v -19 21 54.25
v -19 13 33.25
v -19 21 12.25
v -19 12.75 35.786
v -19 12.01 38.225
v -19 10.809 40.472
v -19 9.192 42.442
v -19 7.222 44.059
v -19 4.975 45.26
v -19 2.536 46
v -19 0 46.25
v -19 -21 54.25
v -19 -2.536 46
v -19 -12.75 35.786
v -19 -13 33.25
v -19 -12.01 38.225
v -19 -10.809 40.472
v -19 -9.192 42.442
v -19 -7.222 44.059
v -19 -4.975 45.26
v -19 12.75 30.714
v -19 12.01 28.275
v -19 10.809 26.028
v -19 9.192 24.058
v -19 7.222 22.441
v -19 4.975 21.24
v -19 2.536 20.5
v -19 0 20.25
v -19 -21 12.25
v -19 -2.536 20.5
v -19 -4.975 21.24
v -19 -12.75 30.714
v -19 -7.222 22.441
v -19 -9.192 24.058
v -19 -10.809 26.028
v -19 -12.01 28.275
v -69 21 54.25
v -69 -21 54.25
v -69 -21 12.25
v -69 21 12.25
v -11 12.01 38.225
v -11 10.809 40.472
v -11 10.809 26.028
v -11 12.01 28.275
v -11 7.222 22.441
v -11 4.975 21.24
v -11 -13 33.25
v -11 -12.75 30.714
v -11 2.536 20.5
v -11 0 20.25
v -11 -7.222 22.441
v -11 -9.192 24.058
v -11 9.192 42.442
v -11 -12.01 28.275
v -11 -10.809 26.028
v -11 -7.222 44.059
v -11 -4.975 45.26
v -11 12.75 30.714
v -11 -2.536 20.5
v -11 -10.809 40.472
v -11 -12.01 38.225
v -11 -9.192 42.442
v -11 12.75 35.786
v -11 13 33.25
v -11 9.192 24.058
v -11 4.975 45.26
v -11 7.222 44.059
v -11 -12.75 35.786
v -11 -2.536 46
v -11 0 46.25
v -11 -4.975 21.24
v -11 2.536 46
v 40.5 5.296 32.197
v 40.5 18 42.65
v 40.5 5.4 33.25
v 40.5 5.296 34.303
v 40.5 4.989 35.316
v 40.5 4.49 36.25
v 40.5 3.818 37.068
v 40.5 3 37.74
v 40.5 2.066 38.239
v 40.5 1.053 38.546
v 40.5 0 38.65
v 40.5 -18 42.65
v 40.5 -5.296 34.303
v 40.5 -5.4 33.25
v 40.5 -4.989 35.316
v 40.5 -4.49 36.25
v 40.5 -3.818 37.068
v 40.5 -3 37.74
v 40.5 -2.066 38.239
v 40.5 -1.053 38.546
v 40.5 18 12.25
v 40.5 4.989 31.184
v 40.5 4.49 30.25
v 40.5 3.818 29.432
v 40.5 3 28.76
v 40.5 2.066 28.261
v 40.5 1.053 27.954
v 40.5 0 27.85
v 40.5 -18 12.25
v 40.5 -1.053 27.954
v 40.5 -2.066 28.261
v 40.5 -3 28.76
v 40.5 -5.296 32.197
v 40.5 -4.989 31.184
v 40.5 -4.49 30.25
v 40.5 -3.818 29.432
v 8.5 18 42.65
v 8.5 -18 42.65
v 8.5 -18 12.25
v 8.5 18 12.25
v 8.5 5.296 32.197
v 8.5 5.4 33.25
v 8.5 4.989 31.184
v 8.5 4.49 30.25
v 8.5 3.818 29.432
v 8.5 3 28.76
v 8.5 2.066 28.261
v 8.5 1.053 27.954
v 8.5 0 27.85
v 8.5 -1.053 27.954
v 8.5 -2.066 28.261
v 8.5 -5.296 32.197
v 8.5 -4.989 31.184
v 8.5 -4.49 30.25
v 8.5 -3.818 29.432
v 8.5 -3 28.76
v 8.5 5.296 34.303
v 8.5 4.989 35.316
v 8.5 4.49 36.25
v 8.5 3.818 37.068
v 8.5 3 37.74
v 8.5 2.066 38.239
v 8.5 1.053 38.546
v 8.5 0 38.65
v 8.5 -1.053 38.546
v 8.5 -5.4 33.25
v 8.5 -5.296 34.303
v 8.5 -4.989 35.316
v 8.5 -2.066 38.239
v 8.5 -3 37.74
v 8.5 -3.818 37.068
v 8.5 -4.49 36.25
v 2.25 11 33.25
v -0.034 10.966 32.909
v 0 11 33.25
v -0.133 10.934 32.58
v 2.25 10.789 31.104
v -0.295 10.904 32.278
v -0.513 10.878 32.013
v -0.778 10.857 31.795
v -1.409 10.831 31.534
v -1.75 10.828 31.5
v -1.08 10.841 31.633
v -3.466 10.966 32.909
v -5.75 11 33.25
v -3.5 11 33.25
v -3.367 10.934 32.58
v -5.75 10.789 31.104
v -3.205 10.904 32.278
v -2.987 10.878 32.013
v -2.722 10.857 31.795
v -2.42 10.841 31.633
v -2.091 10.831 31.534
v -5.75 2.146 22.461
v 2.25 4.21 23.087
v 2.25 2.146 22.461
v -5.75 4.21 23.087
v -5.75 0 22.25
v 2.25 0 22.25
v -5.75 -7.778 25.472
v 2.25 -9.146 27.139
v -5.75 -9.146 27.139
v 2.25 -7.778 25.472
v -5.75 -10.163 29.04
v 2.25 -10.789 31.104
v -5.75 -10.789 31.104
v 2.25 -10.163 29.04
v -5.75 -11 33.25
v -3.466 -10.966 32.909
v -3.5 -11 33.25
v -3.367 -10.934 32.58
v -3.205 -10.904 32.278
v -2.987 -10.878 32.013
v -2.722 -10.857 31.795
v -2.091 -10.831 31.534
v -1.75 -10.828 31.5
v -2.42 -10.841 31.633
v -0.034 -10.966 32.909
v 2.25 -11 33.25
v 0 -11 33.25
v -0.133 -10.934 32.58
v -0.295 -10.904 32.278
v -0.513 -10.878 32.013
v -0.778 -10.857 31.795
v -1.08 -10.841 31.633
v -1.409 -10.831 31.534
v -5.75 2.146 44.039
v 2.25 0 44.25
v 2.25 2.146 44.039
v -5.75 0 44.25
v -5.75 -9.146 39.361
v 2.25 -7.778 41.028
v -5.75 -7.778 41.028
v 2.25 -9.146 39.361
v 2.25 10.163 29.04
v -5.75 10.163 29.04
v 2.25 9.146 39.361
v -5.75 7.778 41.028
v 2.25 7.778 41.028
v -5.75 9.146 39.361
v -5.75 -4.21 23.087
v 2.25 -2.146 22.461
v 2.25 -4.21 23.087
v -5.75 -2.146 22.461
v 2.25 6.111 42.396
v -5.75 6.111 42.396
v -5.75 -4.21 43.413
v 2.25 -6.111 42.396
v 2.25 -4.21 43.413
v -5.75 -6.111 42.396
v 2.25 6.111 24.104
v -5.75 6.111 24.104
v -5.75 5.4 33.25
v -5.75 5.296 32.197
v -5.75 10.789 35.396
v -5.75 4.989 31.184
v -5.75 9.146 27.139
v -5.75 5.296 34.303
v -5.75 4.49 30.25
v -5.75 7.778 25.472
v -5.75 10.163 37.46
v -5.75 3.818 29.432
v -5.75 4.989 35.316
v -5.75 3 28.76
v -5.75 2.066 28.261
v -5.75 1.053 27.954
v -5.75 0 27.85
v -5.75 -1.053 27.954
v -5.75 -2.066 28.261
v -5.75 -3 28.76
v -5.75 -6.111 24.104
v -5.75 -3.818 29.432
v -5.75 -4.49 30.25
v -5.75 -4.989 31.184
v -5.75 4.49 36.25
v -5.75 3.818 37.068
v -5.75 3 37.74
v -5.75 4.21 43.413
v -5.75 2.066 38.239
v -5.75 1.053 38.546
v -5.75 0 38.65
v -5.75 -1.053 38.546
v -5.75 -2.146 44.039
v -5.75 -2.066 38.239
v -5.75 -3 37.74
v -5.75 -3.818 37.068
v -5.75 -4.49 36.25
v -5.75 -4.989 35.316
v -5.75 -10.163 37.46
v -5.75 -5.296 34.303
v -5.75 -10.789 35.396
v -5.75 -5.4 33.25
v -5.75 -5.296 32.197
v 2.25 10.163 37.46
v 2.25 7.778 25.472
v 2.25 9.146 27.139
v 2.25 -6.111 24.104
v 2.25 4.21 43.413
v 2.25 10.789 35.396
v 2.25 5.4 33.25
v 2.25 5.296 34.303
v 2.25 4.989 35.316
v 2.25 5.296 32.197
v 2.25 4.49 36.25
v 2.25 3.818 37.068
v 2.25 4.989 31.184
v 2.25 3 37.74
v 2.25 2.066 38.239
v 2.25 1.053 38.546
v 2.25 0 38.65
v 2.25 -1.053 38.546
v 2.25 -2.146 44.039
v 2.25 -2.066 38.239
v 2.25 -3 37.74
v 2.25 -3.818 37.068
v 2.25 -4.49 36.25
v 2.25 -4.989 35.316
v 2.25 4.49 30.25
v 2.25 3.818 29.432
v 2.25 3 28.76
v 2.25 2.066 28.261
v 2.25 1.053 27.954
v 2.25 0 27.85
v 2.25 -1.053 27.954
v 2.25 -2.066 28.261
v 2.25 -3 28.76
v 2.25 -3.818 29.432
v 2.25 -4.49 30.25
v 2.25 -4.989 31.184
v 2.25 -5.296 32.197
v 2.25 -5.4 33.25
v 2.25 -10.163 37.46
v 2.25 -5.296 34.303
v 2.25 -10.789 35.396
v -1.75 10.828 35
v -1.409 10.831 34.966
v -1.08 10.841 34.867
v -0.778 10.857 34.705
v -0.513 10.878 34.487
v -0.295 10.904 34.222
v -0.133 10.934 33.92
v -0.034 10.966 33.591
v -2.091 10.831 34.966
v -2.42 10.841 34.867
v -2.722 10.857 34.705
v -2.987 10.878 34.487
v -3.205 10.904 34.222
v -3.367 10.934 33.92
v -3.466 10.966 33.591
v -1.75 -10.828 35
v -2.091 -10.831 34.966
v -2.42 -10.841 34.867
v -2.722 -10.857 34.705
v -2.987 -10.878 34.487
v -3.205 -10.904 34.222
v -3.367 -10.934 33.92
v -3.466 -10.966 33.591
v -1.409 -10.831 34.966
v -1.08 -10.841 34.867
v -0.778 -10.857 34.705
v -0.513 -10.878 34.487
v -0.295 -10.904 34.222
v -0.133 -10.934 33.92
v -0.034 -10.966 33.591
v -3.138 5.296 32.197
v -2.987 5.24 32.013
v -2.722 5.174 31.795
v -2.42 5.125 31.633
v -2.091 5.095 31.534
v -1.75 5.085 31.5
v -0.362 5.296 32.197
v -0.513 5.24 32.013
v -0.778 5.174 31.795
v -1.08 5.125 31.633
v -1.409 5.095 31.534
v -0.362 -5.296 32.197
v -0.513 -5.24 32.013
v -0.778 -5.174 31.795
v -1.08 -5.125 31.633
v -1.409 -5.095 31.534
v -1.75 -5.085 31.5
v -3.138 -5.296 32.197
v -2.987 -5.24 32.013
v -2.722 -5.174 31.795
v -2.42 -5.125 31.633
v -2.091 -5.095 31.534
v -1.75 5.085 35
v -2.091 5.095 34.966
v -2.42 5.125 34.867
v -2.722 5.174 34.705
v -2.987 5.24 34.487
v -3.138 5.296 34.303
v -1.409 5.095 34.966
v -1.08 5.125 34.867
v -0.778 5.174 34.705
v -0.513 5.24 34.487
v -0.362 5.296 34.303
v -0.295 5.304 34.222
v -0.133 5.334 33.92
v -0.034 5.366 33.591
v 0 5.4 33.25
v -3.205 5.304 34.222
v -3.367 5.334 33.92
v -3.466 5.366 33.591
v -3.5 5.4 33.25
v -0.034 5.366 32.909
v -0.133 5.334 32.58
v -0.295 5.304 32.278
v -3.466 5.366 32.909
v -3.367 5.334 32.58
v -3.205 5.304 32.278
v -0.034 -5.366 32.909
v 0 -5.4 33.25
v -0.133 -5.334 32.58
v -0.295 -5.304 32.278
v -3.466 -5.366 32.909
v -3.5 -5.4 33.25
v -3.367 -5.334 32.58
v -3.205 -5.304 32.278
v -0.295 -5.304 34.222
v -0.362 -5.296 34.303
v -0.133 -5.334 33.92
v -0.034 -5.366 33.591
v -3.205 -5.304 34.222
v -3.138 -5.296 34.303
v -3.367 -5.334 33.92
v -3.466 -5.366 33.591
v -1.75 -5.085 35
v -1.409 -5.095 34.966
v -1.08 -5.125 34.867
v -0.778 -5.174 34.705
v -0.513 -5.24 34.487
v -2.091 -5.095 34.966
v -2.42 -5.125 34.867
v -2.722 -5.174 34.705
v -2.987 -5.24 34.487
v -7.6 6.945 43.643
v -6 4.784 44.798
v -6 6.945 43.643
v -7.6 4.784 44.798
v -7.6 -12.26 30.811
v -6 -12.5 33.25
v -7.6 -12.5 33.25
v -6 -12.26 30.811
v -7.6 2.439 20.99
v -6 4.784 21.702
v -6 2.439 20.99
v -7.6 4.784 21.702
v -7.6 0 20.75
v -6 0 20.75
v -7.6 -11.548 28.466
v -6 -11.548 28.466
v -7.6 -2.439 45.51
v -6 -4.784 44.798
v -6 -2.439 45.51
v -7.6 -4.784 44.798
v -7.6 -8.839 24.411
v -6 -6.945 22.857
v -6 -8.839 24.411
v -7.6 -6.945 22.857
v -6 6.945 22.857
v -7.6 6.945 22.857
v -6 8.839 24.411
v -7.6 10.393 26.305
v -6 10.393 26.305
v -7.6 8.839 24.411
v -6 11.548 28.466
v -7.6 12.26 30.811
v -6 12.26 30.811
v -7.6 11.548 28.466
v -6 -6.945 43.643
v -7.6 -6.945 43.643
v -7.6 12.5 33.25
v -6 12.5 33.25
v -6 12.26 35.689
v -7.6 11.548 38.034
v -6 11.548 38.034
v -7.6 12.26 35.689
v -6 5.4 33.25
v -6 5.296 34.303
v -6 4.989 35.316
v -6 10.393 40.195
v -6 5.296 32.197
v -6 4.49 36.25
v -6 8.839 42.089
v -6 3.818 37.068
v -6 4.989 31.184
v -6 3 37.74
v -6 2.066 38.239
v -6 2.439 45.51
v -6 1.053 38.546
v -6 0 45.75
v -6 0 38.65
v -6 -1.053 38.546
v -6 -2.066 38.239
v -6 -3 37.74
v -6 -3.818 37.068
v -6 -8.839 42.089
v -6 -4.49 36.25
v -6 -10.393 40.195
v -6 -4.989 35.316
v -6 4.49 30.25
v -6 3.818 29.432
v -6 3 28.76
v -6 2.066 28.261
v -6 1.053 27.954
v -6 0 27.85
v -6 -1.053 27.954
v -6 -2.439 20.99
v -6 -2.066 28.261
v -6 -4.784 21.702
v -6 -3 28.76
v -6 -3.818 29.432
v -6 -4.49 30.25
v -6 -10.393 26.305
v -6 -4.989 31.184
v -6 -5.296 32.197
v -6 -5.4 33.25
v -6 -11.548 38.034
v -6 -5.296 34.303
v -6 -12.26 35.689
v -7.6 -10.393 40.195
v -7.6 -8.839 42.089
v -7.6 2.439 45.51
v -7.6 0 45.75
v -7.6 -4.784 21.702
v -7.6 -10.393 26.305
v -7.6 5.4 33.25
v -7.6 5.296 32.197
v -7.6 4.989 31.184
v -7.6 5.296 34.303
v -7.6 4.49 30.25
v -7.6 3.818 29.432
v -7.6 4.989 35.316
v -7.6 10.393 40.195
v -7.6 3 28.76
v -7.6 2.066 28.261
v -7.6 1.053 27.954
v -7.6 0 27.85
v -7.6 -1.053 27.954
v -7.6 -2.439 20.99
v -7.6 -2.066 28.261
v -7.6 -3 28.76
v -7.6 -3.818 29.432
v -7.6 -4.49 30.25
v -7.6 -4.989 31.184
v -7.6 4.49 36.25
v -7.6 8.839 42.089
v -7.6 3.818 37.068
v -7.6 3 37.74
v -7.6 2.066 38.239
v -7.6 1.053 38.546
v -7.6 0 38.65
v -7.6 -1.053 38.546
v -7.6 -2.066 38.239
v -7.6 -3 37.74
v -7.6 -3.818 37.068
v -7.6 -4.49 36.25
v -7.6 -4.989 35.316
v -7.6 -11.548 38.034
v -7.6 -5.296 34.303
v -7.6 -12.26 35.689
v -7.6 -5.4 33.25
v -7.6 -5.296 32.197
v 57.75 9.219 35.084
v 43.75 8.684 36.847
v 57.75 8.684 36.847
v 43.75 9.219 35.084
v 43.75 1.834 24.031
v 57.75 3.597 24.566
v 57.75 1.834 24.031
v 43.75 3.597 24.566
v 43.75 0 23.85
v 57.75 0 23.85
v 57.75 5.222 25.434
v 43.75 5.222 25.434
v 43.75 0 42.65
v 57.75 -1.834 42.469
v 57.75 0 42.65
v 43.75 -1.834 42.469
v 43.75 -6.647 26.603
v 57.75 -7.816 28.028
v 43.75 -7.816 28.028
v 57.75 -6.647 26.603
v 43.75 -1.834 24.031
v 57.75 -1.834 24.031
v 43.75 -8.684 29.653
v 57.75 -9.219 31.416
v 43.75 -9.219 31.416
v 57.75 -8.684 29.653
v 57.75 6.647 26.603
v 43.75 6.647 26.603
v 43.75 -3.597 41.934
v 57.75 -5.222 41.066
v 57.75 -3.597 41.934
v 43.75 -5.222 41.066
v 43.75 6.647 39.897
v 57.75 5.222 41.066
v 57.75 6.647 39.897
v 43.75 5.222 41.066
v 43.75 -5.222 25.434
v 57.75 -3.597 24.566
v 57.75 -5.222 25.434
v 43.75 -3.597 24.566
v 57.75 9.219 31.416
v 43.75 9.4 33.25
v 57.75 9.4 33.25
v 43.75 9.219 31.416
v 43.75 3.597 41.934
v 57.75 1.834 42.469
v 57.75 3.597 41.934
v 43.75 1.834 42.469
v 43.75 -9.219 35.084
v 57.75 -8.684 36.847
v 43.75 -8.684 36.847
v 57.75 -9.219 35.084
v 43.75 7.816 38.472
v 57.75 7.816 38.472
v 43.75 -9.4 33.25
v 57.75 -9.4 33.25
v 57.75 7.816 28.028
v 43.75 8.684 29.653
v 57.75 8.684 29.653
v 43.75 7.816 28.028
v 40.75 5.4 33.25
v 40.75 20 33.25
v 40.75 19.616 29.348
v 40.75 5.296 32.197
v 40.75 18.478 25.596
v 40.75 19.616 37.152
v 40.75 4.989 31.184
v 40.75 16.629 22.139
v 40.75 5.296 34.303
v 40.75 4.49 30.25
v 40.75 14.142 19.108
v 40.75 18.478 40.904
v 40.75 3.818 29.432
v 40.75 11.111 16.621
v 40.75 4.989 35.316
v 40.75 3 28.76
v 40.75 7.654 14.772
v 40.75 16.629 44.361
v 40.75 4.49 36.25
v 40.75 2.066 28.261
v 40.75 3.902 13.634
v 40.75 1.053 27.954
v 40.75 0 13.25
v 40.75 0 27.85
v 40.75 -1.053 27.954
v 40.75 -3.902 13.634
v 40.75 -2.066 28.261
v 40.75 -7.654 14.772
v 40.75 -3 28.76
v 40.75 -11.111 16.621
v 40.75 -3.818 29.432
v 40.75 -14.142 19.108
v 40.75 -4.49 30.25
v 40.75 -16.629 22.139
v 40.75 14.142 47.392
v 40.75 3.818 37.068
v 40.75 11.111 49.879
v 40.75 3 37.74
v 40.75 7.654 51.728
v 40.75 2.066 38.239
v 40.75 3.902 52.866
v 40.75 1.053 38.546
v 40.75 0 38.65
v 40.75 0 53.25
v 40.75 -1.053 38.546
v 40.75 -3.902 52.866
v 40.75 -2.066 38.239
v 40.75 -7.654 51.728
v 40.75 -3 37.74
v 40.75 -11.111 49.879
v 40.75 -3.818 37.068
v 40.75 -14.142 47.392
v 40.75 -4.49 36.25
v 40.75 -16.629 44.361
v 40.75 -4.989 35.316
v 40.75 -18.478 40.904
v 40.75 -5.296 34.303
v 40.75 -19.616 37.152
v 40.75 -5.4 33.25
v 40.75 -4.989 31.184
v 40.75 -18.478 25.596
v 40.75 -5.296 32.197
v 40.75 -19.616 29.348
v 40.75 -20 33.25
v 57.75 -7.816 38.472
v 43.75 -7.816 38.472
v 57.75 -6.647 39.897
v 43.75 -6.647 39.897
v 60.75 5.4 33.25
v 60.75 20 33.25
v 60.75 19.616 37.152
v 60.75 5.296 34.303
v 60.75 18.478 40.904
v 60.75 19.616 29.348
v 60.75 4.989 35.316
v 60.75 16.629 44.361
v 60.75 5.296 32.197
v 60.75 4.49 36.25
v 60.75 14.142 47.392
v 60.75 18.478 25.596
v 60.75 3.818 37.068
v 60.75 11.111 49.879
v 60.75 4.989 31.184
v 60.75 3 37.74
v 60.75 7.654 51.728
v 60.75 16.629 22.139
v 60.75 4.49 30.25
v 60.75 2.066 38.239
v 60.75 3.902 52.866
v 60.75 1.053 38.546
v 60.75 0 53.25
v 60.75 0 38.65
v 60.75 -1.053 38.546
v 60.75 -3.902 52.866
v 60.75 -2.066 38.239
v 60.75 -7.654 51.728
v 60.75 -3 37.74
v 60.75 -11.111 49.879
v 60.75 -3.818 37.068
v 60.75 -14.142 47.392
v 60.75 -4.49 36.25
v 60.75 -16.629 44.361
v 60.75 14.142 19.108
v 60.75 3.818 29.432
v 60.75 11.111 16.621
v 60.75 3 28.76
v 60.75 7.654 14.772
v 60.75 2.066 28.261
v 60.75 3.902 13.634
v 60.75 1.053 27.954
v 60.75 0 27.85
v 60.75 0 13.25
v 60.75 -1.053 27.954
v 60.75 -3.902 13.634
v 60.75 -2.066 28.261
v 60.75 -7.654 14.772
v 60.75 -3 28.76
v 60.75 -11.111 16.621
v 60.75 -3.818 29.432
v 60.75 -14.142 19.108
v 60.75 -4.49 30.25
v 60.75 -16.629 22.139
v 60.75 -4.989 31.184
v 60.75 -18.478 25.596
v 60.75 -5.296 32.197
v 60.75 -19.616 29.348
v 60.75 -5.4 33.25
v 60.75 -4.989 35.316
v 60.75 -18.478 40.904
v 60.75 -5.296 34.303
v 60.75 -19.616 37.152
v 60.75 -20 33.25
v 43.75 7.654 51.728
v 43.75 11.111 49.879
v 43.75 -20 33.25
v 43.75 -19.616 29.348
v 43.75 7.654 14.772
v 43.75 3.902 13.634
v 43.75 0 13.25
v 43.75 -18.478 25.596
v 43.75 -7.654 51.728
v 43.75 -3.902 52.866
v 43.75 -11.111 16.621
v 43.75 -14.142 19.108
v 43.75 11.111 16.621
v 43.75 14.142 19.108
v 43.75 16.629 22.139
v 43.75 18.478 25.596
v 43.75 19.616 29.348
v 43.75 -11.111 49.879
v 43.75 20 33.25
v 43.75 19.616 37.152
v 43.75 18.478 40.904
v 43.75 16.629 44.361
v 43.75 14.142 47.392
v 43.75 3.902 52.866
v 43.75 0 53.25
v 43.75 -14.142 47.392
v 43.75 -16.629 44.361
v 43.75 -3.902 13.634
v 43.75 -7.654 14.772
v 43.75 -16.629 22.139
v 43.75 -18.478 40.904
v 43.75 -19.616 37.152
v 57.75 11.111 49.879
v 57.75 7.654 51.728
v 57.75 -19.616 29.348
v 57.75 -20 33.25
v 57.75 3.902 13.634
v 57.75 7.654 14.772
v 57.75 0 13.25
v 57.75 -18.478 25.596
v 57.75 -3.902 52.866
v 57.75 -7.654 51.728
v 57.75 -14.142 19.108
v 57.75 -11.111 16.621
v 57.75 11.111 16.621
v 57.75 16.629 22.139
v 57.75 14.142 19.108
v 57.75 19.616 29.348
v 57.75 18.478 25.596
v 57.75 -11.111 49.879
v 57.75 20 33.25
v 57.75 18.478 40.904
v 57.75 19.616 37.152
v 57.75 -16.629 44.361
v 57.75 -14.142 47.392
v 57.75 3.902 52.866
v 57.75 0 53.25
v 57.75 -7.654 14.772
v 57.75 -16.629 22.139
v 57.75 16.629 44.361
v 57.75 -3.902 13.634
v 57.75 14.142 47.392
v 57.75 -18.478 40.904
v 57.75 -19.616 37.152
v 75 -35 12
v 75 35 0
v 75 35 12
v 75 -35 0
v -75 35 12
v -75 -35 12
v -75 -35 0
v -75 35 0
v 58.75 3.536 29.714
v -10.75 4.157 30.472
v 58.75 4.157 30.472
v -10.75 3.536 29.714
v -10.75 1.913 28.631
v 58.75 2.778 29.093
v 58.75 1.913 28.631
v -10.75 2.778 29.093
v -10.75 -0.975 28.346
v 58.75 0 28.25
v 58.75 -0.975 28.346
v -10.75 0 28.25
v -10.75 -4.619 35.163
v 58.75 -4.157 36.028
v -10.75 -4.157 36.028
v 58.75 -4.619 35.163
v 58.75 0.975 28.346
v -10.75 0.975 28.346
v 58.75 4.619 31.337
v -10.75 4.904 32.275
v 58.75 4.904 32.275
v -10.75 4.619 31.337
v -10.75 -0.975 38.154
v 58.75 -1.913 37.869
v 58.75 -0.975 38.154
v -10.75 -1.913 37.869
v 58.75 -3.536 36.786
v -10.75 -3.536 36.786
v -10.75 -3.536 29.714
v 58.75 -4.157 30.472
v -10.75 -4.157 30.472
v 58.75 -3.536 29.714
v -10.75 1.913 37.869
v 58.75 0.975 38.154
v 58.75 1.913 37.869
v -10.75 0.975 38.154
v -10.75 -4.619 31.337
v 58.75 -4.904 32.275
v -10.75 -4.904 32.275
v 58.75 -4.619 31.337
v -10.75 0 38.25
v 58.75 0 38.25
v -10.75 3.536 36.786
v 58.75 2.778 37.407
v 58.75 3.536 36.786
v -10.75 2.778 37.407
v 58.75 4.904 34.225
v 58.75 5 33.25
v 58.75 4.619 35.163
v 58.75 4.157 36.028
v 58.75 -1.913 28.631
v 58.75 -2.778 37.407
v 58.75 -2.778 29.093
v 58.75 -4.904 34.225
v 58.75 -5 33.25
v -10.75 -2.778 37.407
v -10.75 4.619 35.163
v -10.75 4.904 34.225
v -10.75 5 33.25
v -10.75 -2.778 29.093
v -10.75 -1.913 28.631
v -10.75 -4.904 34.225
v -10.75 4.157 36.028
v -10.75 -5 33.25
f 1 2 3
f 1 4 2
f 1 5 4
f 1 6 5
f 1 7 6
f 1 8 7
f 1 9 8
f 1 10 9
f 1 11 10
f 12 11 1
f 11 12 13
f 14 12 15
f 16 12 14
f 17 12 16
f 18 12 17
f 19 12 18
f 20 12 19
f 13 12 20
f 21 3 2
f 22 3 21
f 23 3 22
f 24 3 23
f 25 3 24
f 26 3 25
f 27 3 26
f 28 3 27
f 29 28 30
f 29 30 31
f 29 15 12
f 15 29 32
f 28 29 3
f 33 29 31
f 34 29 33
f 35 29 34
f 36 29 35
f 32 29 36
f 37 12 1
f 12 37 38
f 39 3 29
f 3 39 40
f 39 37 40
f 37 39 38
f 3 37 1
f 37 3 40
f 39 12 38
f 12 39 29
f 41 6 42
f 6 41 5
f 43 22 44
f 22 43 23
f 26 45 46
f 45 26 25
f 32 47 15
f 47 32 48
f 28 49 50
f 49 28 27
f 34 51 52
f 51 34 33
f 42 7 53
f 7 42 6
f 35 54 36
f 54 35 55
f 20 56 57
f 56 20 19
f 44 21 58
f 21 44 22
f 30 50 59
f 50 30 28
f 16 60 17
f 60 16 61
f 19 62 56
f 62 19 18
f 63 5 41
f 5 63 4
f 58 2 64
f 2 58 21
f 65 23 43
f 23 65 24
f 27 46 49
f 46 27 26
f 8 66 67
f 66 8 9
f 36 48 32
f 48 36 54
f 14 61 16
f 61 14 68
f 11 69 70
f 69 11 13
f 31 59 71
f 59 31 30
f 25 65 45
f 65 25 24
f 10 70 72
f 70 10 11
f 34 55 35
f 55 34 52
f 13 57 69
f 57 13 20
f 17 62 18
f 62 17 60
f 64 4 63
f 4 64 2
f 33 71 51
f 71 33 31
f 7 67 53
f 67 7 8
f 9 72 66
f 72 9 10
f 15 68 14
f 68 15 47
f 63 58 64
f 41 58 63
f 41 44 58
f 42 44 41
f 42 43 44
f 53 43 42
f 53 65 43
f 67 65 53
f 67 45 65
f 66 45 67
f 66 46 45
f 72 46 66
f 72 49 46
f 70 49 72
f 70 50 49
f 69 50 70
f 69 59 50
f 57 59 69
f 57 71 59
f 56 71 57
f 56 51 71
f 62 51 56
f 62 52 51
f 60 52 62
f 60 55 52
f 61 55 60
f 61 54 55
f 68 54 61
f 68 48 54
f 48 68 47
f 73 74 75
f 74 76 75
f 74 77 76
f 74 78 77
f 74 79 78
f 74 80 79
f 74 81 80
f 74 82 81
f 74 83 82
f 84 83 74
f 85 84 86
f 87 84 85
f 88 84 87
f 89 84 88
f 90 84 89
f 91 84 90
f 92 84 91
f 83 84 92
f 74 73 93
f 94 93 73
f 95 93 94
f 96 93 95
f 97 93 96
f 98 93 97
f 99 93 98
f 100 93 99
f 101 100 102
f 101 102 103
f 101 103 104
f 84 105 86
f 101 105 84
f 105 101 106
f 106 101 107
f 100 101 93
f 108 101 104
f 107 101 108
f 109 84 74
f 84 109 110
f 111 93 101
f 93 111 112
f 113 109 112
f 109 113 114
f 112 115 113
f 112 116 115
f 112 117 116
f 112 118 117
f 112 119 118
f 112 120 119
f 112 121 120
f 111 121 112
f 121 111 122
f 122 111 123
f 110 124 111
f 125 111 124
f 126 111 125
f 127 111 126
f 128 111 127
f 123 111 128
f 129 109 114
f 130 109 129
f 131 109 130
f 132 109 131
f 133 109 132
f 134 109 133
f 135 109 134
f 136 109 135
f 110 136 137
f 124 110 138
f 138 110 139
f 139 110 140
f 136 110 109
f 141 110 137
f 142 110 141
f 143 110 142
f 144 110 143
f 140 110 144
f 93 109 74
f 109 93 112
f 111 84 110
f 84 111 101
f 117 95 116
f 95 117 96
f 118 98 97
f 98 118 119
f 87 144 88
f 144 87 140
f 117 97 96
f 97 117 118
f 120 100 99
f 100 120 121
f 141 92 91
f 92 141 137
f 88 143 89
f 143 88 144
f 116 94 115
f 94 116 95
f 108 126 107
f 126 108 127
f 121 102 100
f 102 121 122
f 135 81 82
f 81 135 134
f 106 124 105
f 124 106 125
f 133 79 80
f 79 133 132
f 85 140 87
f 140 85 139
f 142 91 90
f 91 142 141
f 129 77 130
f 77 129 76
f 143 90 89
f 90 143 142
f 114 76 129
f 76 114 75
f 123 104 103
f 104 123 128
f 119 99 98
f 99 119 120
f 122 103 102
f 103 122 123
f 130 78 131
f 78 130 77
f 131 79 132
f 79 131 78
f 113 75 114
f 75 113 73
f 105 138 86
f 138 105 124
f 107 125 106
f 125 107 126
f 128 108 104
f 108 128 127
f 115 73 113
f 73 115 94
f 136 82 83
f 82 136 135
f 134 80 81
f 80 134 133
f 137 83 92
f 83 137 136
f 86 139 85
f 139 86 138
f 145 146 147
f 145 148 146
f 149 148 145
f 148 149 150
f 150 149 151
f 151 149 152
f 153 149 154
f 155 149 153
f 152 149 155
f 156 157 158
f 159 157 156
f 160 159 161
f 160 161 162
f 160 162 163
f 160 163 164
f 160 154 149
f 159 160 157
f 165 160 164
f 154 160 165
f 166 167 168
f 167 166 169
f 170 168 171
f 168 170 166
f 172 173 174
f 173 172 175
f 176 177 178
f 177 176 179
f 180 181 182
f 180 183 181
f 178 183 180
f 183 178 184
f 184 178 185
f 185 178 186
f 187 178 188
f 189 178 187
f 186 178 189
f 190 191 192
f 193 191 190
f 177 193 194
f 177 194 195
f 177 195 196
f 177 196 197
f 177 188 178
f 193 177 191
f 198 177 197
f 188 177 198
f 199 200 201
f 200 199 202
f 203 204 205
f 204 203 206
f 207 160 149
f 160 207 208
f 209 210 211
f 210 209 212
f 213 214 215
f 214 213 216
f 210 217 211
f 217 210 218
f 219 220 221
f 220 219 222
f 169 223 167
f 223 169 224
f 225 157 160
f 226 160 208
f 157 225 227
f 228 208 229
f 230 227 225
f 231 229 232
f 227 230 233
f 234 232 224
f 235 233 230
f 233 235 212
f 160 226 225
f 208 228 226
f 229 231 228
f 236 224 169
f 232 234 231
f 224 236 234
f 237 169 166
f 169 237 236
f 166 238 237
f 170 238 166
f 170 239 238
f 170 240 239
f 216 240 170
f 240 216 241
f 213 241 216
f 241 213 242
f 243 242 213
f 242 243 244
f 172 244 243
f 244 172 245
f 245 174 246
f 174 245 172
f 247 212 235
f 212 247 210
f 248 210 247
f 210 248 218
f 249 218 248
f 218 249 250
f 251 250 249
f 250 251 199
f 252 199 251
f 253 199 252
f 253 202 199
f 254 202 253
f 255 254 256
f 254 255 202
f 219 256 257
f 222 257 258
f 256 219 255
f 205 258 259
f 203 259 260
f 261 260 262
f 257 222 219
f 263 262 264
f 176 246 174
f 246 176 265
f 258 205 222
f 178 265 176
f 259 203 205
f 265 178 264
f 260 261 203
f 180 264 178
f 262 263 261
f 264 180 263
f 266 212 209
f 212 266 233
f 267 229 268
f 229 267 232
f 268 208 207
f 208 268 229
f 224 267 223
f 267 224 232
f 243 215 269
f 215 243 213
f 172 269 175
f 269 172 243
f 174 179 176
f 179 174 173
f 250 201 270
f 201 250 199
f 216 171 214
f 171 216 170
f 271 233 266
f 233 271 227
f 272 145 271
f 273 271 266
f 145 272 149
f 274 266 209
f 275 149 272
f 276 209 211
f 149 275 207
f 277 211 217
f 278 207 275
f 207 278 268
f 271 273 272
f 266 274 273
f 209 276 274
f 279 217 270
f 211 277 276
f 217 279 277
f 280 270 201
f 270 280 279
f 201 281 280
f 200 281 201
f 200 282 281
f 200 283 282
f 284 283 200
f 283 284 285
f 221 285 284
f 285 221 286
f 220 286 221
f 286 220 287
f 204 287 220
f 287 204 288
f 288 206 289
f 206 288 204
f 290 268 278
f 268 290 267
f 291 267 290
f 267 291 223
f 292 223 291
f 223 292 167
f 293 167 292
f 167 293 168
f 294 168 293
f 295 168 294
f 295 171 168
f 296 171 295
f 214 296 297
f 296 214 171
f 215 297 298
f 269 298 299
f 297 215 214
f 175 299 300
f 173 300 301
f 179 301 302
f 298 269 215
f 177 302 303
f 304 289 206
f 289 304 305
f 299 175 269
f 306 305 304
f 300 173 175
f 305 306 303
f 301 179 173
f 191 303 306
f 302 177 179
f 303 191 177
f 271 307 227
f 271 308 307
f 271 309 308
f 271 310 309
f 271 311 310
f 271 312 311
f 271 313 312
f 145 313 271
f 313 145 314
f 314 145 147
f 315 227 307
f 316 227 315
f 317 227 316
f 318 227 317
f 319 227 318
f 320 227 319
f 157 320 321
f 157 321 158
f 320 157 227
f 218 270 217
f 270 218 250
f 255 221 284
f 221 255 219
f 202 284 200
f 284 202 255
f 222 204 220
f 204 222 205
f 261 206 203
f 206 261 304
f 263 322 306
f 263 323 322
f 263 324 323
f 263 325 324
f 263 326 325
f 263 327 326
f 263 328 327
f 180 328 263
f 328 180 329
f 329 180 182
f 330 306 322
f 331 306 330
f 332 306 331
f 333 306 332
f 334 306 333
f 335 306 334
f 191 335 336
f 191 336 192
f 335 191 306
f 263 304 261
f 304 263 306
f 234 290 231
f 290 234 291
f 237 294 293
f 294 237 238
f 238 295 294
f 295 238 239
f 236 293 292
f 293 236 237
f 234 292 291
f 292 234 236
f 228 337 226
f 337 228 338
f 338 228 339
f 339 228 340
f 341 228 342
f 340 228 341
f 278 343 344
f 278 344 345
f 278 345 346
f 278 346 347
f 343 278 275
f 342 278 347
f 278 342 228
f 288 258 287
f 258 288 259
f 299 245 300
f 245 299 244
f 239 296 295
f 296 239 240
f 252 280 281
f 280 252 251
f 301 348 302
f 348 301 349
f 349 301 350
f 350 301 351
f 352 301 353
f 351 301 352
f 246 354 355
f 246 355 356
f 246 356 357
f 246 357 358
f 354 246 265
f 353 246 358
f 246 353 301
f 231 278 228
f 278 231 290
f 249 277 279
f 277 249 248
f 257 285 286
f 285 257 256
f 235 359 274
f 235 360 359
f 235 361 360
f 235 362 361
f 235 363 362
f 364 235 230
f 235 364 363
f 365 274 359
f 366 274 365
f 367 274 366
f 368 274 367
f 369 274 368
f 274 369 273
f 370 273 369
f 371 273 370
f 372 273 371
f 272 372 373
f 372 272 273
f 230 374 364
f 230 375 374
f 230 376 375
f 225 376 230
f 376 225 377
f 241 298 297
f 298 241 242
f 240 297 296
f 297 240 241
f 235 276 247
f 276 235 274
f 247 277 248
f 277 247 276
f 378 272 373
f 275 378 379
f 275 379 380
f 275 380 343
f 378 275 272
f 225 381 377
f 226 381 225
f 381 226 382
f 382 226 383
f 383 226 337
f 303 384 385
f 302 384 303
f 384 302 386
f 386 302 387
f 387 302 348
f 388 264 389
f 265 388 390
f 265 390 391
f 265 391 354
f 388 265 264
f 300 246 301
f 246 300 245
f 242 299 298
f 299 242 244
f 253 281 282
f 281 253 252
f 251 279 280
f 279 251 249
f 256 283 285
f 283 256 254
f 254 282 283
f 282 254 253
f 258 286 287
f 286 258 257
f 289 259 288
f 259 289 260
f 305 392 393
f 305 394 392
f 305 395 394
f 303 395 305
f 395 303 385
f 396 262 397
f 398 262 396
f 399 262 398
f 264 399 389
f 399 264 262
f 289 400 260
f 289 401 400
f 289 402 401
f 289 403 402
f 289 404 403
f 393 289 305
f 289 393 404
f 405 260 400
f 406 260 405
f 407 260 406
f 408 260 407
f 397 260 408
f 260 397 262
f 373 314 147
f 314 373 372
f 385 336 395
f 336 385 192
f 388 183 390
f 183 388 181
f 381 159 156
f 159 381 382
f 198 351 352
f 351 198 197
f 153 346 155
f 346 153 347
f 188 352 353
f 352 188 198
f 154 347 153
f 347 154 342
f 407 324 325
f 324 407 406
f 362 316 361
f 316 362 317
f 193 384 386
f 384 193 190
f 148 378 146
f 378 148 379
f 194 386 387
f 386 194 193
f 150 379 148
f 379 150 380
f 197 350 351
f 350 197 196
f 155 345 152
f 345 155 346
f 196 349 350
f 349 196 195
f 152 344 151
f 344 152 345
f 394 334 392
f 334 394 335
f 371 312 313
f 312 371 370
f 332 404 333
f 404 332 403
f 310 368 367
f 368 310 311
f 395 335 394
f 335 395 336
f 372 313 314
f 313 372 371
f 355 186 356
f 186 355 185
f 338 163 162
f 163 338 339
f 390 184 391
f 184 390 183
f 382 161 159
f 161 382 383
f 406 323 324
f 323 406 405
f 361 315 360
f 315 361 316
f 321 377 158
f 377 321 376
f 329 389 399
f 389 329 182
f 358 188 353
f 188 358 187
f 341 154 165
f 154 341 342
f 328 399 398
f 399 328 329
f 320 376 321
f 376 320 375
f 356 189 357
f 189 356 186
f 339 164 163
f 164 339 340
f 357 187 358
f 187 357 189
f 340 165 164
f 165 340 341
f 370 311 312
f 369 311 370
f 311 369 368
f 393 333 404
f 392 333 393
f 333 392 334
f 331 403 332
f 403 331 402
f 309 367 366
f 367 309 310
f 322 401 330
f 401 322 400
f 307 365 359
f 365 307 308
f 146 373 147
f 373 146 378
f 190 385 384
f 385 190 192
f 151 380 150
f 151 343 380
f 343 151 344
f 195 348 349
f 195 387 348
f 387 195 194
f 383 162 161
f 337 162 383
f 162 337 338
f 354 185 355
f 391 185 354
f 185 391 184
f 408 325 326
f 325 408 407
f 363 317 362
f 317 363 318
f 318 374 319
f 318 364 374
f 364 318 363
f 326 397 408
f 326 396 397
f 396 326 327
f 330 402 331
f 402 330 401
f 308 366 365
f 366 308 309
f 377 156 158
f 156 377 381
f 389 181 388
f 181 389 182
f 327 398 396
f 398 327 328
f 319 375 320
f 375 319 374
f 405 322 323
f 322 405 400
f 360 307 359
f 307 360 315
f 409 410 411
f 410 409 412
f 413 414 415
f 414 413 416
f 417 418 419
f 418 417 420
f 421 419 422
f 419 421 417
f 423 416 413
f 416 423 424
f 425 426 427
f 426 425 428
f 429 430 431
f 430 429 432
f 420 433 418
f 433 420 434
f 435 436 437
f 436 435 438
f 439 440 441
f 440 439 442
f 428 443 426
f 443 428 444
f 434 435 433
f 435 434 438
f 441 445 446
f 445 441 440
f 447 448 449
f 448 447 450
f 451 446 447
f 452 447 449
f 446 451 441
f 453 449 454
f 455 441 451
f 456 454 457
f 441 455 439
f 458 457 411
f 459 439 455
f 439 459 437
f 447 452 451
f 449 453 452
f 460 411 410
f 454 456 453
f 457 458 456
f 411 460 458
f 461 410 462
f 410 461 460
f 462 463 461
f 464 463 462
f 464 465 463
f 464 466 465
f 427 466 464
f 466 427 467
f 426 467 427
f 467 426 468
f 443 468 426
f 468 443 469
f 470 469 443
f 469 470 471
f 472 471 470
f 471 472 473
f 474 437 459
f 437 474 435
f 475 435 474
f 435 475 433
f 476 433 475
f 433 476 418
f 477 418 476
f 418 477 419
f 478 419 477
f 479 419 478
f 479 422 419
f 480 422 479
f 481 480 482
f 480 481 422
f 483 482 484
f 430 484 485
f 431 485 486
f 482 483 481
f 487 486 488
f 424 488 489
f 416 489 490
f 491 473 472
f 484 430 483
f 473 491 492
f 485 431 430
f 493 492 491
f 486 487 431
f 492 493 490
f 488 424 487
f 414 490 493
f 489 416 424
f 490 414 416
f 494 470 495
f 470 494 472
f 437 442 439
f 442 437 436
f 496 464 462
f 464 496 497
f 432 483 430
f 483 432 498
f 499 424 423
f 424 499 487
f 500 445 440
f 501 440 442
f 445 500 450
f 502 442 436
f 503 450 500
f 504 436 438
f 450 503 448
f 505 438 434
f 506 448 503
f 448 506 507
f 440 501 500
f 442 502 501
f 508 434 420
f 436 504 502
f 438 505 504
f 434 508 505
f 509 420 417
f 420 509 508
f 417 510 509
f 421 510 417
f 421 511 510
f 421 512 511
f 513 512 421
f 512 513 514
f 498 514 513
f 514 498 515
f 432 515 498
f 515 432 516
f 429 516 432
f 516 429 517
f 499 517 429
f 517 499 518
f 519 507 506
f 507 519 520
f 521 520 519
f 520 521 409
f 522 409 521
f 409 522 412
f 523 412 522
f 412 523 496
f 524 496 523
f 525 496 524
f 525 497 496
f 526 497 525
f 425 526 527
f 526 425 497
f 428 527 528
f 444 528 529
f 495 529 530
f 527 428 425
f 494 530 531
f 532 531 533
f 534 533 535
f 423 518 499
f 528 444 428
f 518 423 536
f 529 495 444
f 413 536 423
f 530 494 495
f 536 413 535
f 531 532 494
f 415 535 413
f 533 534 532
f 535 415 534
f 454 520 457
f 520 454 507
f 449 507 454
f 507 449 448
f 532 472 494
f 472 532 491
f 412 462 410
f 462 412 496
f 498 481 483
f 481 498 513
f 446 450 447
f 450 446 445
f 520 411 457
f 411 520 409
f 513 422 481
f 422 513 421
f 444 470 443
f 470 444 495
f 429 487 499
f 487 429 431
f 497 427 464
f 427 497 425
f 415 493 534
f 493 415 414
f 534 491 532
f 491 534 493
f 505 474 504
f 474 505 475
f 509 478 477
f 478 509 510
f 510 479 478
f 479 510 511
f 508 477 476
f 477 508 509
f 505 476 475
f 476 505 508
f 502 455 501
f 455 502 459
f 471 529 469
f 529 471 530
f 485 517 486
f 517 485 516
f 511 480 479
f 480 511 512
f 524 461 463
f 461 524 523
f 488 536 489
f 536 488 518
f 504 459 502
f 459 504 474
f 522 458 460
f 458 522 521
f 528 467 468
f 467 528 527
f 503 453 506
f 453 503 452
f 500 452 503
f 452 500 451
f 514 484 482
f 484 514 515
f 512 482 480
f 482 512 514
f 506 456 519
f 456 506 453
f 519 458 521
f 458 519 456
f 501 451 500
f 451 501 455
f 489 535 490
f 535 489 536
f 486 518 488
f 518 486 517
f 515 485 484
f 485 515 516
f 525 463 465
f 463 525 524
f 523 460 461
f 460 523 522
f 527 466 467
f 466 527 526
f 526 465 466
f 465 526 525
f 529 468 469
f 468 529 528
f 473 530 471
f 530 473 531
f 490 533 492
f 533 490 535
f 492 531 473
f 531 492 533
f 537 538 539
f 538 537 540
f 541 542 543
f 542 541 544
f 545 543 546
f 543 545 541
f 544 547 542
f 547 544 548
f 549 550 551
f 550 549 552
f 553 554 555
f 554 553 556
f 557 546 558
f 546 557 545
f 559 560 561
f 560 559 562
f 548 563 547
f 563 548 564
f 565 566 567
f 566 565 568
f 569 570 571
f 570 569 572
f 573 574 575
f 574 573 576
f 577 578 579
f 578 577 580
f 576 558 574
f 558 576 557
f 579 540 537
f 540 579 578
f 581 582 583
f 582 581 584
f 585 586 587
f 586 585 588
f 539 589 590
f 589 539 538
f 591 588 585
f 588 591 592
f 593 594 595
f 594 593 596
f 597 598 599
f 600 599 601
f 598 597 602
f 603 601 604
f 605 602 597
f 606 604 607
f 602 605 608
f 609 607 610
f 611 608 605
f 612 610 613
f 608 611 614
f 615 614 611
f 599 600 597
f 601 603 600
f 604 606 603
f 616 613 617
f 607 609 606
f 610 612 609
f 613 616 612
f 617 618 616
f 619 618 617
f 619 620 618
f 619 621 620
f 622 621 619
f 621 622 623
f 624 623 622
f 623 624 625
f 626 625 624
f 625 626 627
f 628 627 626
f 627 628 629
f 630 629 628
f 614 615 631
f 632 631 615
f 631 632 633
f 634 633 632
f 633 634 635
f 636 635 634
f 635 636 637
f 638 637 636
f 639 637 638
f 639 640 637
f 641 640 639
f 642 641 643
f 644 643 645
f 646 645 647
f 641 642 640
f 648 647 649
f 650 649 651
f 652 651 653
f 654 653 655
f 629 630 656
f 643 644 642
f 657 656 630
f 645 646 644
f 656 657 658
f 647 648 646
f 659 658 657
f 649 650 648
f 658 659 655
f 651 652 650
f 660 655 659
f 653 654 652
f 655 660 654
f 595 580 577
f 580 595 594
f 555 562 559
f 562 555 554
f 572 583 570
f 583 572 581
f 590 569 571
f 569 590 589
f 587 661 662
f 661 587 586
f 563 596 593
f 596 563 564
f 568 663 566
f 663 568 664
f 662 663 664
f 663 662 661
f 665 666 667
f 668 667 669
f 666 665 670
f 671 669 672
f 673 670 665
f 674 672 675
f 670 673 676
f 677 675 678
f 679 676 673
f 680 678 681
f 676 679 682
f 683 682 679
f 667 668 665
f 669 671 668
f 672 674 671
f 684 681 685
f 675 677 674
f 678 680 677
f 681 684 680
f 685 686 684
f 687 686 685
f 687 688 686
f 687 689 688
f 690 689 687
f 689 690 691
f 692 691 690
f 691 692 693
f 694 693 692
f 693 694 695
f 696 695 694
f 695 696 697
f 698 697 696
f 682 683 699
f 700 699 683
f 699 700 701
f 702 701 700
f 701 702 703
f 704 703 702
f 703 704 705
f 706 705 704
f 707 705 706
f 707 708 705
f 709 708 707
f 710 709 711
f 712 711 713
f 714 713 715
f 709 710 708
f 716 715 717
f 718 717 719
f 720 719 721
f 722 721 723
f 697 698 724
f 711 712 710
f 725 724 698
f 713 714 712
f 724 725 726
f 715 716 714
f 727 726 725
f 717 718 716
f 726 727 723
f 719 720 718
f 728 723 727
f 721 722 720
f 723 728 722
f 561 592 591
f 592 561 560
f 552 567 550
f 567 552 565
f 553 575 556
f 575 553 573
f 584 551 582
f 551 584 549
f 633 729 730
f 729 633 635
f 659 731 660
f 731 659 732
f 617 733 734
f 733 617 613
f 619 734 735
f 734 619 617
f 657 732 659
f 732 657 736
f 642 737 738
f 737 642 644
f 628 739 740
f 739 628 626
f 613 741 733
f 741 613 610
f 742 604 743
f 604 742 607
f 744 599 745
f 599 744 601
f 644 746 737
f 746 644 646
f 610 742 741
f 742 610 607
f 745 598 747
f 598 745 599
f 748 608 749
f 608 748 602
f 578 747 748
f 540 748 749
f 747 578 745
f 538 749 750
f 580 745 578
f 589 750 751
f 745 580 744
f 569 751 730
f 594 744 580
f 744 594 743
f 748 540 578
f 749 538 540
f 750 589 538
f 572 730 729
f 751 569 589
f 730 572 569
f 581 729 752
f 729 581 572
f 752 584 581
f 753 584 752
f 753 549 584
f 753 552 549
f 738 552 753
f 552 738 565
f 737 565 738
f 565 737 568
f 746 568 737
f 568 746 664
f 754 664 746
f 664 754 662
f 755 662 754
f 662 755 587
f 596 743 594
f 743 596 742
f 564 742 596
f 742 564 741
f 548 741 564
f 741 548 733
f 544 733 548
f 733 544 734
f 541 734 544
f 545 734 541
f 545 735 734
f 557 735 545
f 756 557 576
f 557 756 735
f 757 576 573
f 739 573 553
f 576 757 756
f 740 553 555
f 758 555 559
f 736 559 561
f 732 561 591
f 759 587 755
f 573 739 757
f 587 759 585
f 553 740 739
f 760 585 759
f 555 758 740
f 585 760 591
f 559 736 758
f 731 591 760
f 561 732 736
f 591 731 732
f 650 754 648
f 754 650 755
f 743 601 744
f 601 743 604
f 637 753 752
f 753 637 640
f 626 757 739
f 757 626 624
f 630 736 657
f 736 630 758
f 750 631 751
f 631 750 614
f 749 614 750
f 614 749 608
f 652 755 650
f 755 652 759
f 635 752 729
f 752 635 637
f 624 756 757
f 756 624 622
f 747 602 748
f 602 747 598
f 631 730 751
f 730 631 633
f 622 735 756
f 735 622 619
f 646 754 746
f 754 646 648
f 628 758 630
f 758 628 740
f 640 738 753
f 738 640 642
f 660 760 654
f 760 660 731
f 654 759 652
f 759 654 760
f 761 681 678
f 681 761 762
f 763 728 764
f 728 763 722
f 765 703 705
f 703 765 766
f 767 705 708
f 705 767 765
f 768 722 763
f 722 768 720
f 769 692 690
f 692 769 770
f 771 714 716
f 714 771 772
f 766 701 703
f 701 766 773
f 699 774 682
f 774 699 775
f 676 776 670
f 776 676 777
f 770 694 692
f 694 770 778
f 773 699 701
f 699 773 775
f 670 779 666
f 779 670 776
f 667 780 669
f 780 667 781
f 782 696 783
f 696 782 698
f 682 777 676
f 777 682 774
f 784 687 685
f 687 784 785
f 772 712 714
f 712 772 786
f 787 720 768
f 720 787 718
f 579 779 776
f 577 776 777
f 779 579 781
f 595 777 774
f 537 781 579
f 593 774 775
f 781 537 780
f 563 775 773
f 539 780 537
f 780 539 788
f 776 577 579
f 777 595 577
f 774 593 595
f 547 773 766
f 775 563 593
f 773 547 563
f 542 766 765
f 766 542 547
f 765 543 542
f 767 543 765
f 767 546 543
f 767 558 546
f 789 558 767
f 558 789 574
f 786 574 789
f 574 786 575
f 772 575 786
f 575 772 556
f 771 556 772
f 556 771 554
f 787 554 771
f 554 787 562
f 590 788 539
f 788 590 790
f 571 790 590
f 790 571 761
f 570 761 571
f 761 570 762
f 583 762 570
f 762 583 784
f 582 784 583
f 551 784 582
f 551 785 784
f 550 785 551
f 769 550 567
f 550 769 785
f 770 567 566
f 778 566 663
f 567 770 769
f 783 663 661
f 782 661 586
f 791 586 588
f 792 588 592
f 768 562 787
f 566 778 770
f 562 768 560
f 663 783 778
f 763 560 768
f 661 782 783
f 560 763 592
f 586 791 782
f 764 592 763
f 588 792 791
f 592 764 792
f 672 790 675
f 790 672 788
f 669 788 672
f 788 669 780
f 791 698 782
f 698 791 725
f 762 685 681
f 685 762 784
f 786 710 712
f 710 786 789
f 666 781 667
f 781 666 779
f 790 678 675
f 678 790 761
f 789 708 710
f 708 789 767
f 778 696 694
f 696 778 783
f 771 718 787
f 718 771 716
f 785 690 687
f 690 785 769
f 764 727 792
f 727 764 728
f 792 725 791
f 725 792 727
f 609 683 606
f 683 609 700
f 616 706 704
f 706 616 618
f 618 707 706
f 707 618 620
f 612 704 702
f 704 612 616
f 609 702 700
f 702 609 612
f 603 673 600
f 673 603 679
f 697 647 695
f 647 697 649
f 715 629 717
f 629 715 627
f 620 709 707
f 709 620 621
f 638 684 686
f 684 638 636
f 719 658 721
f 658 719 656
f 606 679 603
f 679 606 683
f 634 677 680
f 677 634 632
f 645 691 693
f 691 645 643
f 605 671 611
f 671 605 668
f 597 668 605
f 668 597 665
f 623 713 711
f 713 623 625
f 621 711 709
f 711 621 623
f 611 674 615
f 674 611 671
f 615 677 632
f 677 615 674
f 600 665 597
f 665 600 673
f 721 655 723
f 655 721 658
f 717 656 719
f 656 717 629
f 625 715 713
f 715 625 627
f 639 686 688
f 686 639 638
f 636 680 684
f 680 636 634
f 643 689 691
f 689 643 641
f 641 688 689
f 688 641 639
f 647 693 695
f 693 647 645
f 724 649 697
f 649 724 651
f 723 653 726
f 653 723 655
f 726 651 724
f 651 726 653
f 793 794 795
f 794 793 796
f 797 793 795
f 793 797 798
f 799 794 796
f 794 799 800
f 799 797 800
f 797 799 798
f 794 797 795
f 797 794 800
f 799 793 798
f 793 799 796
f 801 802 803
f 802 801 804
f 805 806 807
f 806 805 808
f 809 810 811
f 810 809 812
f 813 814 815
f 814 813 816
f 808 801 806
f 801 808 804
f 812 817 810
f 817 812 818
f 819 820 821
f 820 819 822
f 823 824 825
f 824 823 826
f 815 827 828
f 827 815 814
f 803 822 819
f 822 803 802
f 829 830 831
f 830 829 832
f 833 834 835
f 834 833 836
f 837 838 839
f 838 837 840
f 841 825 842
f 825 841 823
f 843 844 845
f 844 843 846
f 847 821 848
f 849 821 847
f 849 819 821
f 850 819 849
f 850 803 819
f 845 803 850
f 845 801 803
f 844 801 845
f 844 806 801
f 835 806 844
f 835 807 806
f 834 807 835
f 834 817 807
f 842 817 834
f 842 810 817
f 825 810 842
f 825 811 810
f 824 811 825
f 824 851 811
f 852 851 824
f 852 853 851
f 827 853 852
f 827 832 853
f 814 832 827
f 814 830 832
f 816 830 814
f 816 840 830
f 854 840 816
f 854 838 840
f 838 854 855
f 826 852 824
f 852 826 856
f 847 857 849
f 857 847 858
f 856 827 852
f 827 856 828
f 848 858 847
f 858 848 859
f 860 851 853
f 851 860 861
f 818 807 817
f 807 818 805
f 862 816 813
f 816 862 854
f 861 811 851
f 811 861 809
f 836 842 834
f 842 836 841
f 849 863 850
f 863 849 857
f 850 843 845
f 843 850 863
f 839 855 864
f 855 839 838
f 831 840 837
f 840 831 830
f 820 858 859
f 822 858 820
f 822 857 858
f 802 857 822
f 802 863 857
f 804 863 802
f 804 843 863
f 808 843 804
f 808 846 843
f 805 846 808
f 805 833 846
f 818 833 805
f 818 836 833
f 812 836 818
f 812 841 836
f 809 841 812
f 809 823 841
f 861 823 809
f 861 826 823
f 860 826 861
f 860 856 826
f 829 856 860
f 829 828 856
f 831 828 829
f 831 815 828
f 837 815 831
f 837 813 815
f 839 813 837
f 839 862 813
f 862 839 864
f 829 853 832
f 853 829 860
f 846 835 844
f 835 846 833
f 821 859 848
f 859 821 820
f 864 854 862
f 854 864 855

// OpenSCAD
$fn = 32;

// ------------------------------------------------------------------------
// Motor drive station: motor 50 x 42 mm, shaft d10, pulley d40
// Every part is its own module, assembly() places every instance.
// ------------------------------------------------------------------------

// --- part 1 ---
module station_bed() {
  difference() {
    translate([-75, -35, 0]) cube([150, 70, 12]);
  }
}

// --- part 2 ---
module drive_motor() {
  union() {
    translate([-25, -21, 0]) cube([50, 42, 42]);
    translate([29, 0, 21]) rotate([0, 90, 0]) cylinder(h = 8, d = 26, center = true);
  }
}

// --- part 3 ---
module pillow_block() {
  difference() {
    translate([-16, -18, 0]) cube([32, 36, 30.4]);
    translate([0, 0, 21]) rotate([0, 90, 0]) cylinder(h = 34, d = 10.8, center = true);
  }
}

// --- part 4 ---
module drive_shaft() {
  translate([0, 0, -34.75]) cylinder(h = 69.5, d = 10);
}

// --- part 5 ---
module shaft_collar() {
  difference() {
    cylinder(h = 8, d = 22);
    translate([0, 0, -1]) cylinder(h = 10, d = 10.8);
    translate([0, 0, 4]) rotate([90, 0, 0]) cylinder(h = 24, d = 3.5, center = true);
  }
}

// --- part 6 ---
module collar_washer() {
  difference() {
      translate([0, 0, 0]) cylinder(h = 1.6, d = 25);
      translate([0, 0, -1]) cylinder(h = 3.6, d = 10.8);
    }
}

// --- part 7 ---
module drive_pulley() {
  difference() {
    union() {
      cylinder(h = 20, d = 18.8);
      cylinder(h = 3, d = 40);
      translate([0, 0, 17]) cylinder(h = 3, d = 40);
    }
    translate([0, 0, -1]) cylinder(h = 22, d = 10.8);
  }
}

// --- assembly ---
module assembly() {
  color([0.80, 0.24, 0.20]) translate([0, 0, 0]) rotate([0, 0, 0]) station_bed();
  color([0.20, 0.45, 0.75]) translate([-44, 0, 12.25]) rotate([0, 0, 0]) drive_motor();
  color([0.25, 0.62, 0.32]) translate([24.5, 0, 12.25]) rotate([0, 0, 0]) pillow_block();
  color([0.92, 0.70, 0.18]) translate([24, 0, 33.25]) rotate([0, 90, 0]) drive_shaft();
  color([0.58, 0.35, 0.70]) translate([-5.75, 0, 33.25]) rotate([0, 90, 0]) shaft_collar();
  color([0.16, 0.66, 0.66]) translate([-7.6, 0, 33.25]) rotate([0, 90, 0]) collar_washer();
  color([0.85, 0.48, 0.18]) translate([40.75, 0, 33.25]) rotate([0, 90, 0]) drive_pulley();
}

assembly();
